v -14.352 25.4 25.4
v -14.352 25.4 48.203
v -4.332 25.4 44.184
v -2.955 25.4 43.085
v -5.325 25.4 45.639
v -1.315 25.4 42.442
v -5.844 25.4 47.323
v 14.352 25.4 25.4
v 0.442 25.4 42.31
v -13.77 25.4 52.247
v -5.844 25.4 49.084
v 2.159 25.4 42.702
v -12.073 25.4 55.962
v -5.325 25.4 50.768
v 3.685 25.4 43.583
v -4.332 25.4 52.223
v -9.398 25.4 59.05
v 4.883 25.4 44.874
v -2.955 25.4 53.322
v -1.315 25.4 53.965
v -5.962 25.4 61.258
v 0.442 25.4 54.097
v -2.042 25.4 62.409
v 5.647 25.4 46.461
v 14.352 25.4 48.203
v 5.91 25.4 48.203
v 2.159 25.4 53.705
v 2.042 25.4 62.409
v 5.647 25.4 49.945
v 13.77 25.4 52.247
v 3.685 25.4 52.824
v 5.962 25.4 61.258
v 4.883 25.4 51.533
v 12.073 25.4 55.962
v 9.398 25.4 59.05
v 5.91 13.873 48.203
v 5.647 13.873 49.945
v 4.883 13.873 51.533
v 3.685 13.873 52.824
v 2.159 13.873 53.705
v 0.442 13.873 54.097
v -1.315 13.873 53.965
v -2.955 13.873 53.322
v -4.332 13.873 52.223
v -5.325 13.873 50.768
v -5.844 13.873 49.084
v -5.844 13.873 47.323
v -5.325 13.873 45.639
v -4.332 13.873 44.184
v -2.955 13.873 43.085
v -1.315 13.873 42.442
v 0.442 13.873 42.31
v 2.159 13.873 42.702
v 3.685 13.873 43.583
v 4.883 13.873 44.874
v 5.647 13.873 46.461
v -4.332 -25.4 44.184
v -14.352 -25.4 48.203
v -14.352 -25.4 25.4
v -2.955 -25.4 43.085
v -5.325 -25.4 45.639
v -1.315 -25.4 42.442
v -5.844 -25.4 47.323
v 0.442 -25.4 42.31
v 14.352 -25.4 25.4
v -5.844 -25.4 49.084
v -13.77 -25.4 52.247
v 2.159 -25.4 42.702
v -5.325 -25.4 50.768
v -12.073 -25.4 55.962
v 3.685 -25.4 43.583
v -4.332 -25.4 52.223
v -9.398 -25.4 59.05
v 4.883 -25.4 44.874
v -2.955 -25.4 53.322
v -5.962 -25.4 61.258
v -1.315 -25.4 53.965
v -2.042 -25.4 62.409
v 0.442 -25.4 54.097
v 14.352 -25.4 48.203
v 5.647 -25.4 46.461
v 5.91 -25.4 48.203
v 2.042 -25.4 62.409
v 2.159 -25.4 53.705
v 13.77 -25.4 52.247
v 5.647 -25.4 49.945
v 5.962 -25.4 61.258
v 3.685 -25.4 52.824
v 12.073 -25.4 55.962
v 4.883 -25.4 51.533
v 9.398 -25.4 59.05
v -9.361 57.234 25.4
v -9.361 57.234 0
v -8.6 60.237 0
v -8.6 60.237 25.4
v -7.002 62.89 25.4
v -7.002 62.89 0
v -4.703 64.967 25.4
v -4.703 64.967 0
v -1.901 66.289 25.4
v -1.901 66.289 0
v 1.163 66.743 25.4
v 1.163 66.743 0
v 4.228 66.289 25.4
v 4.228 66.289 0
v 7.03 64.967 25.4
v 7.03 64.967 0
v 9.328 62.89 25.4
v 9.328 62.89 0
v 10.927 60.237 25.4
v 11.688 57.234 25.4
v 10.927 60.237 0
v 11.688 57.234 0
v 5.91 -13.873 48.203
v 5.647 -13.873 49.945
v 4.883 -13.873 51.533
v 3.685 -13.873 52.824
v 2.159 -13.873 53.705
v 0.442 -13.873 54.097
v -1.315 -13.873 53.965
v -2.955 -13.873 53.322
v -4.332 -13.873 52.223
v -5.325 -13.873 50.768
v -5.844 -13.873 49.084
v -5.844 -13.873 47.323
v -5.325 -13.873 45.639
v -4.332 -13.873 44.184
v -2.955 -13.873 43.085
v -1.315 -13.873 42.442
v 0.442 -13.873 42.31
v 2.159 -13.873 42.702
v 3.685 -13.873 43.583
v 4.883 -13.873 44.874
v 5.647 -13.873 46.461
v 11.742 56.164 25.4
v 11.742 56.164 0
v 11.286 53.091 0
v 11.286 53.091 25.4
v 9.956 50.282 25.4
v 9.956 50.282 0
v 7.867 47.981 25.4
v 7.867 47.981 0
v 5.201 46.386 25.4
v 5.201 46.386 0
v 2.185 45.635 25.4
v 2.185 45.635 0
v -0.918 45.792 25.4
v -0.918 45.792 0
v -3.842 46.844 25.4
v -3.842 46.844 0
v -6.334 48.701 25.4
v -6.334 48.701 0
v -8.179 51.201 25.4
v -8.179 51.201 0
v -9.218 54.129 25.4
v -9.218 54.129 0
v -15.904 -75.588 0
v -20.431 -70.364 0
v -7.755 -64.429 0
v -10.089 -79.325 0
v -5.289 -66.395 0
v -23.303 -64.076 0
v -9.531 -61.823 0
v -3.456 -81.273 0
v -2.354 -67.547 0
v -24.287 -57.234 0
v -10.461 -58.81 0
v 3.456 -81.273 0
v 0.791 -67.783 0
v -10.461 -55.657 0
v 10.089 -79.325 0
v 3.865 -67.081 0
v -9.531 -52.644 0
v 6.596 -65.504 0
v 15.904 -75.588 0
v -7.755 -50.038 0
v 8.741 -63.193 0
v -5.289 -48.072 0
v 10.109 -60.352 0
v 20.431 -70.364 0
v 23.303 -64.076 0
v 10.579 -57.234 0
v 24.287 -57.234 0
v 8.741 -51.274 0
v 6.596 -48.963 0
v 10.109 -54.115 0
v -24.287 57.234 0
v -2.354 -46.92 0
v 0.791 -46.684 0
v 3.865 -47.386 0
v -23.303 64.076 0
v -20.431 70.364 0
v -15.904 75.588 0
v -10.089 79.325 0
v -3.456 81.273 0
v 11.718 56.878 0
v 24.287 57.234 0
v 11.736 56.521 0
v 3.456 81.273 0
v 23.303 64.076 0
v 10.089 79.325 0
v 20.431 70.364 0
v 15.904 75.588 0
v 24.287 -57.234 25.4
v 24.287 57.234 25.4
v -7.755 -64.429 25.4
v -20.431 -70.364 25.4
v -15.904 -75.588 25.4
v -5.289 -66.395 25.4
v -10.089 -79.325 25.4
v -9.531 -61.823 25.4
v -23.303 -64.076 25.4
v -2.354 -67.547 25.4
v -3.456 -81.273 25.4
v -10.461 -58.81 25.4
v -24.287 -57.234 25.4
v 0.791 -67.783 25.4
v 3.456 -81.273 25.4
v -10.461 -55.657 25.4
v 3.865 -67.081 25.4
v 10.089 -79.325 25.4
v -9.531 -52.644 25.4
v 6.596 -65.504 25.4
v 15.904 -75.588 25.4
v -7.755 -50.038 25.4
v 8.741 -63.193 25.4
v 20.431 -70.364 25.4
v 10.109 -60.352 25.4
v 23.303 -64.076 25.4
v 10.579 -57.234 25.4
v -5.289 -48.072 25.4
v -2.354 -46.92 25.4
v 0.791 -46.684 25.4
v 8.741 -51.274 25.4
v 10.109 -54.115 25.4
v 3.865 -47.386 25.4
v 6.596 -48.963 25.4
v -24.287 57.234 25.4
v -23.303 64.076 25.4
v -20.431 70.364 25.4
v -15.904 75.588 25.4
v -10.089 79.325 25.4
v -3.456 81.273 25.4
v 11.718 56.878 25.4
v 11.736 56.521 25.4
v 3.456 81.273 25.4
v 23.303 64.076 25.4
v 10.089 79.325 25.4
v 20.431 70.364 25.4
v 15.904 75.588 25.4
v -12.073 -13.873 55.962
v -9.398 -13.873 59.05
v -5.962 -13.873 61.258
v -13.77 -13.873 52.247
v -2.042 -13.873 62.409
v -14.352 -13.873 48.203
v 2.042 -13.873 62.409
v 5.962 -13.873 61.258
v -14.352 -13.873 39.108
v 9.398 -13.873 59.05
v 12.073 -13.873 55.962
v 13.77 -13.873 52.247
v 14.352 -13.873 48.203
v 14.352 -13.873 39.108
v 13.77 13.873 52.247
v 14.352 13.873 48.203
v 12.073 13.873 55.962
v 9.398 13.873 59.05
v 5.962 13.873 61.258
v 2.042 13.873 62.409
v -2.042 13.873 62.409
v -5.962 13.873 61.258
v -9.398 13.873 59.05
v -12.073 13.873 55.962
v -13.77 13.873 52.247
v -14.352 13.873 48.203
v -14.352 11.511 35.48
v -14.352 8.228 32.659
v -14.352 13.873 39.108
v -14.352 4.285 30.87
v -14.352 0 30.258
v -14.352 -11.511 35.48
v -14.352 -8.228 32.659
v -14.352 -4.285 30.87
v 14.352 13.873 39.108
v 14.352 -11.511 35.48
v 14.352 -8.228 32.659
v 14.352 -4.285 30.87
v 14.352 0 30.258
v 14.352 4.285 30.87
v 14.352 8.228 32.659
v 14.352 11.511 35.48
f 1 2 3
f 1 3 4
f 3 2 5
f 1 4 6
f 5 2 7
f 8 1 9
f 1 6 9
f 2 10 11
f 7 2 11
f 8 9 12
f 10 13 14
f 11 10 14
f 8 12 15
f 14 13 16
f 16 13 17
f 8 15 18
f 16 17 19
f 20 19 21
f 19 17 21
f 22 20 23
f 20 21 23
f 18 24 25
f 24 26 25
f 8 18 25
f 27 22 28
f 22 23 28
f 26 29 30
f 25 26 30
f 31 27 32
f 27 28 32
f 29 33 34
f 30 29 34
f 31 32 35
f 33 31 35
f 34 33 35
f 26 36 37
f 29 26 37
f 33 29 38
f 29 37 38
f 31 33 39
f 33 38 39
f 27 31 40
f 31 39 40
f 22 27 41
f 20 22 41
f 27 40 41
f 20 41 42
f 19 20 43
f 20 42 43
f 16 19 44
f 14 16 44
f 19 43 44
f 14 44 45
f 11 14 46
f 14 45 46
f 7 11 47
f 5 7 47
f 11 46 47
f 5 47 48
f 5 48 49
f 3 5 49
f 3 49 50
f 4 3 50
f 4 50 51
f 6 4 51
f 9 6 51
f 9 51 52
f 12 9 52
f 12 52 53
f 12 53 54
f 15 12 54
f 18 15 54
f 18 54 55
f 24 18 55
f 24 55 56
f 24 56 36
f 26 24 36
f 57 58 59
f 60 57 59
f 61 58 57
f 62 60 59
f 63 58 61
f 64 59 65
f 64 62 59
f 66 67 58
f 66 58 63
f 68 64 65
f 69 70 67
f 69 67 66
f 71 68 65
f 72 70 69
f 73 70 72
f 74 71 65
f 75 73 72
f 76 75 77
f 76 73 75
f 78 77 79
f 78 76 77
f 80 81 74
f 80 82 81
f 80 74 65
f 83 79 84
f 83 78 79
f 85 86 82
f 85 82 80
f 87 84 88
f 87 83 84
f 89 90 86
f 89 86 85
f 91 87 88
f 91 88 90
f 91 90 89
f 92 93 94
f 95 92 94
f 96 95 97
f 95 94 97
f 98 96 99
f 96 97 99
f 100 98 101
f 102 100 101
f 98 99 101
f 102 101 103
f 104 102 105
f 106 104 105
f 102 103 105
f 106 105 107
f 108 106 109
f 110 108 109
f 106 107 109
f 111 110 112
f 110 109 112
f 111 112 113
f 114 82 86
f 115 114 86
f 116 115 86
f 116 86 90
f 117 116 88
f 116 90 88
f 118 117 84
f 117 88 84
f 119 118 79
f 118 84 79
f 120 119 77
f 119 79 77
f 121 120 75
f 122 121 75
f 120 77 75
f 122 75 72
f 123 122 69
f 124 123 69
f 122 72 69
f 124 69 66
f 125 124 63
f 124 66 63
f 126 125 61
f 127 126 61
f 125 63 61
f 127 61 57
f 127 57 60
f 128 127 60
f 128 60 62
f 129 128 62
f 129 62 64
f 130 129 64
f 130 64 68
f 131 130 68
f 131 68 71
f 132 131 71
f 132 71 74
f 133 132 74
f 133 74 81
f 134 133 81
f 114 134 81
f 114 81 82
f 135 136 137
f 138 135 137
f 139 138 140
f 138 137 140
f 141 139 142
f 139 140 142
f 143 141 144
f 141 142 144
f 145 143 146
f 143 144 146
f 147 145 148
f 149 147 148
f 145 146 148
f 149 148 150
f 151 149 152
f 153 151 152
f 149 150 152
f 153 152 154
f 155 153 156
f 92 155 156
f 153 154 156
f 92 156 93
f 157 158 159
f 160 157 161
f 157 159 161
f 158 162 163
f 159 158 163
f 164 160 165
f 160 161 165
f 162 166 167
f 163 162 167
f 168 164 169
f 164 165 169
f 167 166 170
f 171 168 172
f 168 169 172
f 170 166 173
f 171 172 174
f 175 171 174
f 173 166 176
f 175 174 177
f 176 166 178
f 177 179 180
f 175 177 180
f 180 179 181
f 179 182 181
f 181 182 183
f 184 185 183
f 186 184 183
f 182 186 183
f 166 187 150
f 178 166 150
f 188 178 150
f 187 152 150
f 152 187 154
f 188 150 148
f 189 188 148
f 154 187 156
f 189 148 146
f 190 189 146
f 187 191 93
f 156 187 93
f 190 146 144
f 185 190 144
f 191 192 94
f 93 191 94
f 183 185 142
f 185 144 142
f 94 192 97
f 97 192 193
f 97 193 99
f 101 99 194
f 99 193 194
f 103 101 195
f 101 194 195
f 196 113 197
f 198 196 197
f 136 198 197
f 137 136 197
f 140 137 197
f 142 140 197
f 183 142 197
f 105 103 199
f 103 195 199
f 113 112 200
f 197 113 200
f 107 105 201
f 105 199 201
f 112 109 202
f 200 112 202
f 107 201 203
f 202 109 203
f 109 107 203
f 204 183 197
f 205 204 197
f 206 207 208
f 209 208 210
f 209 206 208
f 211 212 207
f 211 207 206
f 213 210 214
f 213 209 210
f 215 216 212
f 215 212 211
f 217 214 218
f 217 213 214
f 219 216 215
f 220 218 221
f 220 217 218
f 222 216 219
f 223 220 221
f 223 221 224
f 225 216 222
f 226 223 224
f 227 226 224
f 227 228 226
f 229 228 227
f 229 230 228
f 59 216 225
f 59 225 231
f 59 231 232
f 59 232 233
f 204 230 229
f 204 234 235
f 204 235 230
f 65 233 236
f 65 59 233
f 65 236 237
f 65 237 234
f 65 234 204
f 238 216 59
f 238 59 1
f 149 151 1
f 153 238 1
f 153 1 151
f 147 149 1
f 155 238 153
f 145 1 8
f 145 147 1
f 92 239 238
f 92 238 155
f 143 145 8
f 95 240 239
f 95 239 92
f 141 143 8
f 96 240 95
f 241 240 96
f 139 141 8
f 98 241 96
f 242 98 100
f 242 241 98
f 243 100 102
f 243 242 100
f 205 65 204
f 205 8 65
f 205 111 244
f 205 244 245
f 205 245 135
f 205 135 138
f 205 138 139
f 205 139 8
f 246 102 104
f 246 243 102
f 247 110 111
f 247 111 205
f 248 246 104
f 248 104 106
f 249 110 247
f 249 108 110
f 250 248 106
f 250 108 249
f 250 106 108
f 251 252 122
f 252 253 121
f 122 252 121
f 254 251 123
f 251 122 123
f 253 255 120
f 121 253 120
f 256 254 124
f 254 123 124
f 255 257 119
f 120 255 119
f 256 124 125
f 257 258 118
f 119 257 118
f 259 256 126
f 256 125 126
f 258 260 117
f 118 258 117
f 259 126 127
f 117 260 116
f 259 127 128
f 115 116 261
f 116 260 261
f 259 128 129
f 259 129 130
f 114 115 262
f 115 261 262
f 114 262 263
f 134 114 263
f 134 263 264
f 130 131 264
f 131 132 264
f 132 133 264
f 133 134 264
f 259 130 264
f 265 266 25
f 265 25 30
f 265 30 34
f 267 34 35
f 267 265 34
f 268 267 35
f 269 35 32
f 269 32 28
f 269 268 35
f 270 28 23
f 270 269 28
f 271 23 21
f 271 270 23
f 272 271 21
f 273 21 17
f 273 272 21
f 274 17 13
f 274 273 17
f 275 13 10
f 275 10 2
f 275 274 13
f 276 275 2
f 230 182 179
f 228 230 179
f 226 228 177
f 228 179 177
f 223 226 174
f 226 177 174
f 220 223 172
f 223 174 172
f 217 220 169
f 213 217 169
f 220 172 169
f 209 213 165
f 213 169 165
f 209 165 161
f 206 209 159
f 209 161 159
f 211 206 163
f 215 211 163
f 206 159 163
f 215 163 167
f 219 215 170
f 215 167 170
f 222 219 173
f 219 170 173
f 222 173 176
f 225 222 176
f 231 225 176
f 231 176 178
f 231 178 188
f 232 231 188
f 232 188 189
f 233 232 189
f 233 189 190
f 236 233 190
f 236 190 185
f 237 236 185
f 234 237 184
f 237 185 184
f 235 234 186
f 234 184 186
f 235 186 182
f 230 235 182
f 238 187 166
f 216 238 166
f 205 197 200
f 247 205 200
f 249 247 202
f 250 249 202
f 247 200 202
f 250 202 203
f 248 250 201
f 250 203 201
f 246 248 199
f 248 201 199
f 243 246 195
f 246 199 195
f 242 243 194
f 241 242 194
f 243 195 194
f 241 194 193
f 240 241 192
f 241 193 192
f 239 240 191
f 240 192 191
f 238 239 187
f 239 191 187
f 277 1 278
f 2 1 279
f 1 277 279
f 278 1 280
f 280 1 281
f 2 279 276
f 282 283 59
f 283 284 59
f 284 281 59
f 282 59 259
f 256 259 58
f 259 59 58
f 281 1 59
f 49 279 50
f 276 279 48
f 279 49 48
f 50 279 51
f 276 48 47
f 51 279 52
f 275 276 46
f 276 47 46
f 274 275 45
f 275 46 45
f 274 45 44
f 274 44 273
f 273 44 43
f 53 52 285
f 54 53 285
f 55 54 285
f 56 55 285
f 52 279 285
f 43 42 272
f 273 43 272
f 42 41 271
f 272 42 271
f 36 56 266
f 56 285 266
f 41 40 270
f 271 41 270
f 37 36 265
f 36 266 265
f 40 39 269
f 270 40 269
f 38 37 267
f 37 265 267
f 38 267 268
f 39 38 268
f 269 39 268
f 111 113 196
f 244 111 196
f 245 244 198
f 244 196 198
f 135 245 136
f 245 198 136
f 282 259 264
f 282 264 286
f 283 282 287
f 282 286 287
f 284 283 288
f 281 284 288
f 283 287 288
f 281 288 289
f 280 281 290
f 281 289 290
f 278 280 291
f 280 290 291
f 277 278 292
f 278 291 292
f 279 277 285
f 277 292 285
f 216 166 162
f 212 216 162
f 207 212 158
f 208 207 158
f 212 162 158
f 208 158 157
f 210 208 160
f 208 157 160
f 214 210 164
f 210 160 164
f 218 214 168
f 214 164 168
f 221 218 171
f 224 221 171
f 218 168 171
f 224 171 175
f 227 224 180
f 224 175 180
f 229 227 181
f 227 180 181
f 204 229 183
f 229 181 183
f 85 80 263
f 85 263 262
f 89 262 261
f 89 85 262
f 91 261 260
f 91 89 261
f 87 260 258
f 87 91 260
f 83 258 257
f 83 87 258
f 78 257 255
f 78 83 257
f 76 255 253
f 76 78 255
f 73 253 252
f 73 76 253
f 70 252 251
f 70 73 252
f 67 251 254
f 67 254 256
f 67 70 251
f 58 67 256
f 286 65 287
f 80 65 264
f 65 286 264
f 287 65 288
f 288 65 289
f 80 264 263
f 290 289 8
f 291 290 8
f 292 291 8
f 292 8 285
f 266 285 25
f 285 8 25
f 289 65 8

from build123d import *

# Parameters (mm, degrees)
F1_DEPTH = 25.4
F2_W     = 28.7031400949
F2_H     = 44.6516051888
F3_DEPTH = 25.4
F4_DEPTH = 25.4
F5_R     = 5.9098450102
F6_DEPTH = 106.9210470388
F7_W     = 27.7463691309
F7_H     = 9.0954080224
F7_H_2   = 14.3515700474
F8_DEPTH = 38.6391121352


with BuildPart() as f1:
    # F0 (on Top) → F1 (new body)
    with BuildSketch(Plane.XY):
        with BuildLine():
            Line((24.2865420878, -57.233504951), (24.2865420878, 57.233504951))
            Line((24.2865420878, 57.233504951), (11.6877524542, 57.233504951))
            ThreePointArc((11.6877524542, 57.233504951), (11.7283742061, 56.6995761613), (11.7419263642, 56.1642758548))
            ThreePointArc((11.7419263642, 56.1642758548), (0.6278652442, 45.5990671994), (-9.3614213529, 57.233504951))
            Line((-9.3614213529, 57.233504951), (-24.2865420878, 57.233504951))
            Line((-24.2865420878, 57.233504951), (-24.2865420878, -57.233504951))
            Line((-24.2865420878, -57.233504951), (-10.5787608136, -57.233504951))
            ThreePointArc((-10.5787608136, -57.233504951), (0, -46.6547441374), (10.5787608136, -57.233504951))
            Line((10.5787608136, -57.233504951), (24.2865420878, -57.233504951))
        make_face()
        with BuildLine():
            ThreePointArc((-24.2865420878, -57.233504951), (0, -81.5200470388), (24.2865420878, -57.233504951))
            Line((24.2865420878, -57.233504951), (10.5787608136, -57.233504951))
            ThreePointArc((10.5787608136, -57.233504951), (0, -67.8122657646), (-10.5787608136, -57.233504951))
            Line((-10.5787608136, -57.233504951), (-24.2865420878, -57.233504951))
        make_face()
        with BuildLine():
            Line((11.6877524542, 57.233504951), (24.2865420878, 57.233504951))
            ThreePointArc((24.2865420878, 57.233504951), (0, 81.5200470388), (-24.2865420878, 57.233504951))
            Line((-24.2865420878, 57.233504951), (-9.3614213529, 57.233504951))
            ThreePointArc((-9.3614213529, 57.233504951), (1.1631655507, 66.7430366684), (11.6877524542, 57.233504951))
        make_face()
    extrude(amount=F1_DEPTH)

    # F2 (on Front) → F3 (join)
    with BuildSketch(Plane.XZ):
        with Locations((0, 25.8776322007)):
            Rectangle(F2_W, F2_H)
        with BuildLine():
            Line((-14.3515700474, 48.2034347951), (14.3515700474, 48.2034347951))
            ThreePointArc((14.3515700474, 48.2034347951), (0, 62.5550048426), (-14.3515700474, 48.2034347951))
        make_face()
    extrude(amount=F3_DEPTH)

    # F4 (add): a face of the model
    f4_faces = [f1.faces().sort_by_distance(p)[0] for p in [
        (0, 0, 42.5881236801),
    ]]
    extrude(f4_faces, amount=F4_DEPTH)

    # F5 (on face) → F6 (cut, through all)
    with BuildSketch(Plane.XZ.offset(25.4)):
        with Locations((0, 48.2034347951)):
            Circle(F5_R)
    extrude(amount=-F6_DEPTH, mode=Mode.SUBTRACT)

    # F7 (on face) → F8 (cut, through all)
    with BuildSketch(Plane.YZ.offset(14.3515700474)):
        with BuildLine():
            Line((13.8731850311, 39.1080267727), (-13.8731840998, 39.1080267727))
            ThreePointArc((-13.8731840998, 39.1080267727), (4.657e-07, 30.2578937262), (13.8731850311, 39.1080267727))
        make_face()
        with Locations((4.657e-07, 43.6557307839)):
            Rectangle(F7_W, F7_H)
        with Locations((4.657e-07, 55.3792198189)):
            Rectangle(F7_W, F7_H_2)
    extrude(amount=-F8_DEPTH, mode=Mode.SUBTRACT)


solid = f1.part
